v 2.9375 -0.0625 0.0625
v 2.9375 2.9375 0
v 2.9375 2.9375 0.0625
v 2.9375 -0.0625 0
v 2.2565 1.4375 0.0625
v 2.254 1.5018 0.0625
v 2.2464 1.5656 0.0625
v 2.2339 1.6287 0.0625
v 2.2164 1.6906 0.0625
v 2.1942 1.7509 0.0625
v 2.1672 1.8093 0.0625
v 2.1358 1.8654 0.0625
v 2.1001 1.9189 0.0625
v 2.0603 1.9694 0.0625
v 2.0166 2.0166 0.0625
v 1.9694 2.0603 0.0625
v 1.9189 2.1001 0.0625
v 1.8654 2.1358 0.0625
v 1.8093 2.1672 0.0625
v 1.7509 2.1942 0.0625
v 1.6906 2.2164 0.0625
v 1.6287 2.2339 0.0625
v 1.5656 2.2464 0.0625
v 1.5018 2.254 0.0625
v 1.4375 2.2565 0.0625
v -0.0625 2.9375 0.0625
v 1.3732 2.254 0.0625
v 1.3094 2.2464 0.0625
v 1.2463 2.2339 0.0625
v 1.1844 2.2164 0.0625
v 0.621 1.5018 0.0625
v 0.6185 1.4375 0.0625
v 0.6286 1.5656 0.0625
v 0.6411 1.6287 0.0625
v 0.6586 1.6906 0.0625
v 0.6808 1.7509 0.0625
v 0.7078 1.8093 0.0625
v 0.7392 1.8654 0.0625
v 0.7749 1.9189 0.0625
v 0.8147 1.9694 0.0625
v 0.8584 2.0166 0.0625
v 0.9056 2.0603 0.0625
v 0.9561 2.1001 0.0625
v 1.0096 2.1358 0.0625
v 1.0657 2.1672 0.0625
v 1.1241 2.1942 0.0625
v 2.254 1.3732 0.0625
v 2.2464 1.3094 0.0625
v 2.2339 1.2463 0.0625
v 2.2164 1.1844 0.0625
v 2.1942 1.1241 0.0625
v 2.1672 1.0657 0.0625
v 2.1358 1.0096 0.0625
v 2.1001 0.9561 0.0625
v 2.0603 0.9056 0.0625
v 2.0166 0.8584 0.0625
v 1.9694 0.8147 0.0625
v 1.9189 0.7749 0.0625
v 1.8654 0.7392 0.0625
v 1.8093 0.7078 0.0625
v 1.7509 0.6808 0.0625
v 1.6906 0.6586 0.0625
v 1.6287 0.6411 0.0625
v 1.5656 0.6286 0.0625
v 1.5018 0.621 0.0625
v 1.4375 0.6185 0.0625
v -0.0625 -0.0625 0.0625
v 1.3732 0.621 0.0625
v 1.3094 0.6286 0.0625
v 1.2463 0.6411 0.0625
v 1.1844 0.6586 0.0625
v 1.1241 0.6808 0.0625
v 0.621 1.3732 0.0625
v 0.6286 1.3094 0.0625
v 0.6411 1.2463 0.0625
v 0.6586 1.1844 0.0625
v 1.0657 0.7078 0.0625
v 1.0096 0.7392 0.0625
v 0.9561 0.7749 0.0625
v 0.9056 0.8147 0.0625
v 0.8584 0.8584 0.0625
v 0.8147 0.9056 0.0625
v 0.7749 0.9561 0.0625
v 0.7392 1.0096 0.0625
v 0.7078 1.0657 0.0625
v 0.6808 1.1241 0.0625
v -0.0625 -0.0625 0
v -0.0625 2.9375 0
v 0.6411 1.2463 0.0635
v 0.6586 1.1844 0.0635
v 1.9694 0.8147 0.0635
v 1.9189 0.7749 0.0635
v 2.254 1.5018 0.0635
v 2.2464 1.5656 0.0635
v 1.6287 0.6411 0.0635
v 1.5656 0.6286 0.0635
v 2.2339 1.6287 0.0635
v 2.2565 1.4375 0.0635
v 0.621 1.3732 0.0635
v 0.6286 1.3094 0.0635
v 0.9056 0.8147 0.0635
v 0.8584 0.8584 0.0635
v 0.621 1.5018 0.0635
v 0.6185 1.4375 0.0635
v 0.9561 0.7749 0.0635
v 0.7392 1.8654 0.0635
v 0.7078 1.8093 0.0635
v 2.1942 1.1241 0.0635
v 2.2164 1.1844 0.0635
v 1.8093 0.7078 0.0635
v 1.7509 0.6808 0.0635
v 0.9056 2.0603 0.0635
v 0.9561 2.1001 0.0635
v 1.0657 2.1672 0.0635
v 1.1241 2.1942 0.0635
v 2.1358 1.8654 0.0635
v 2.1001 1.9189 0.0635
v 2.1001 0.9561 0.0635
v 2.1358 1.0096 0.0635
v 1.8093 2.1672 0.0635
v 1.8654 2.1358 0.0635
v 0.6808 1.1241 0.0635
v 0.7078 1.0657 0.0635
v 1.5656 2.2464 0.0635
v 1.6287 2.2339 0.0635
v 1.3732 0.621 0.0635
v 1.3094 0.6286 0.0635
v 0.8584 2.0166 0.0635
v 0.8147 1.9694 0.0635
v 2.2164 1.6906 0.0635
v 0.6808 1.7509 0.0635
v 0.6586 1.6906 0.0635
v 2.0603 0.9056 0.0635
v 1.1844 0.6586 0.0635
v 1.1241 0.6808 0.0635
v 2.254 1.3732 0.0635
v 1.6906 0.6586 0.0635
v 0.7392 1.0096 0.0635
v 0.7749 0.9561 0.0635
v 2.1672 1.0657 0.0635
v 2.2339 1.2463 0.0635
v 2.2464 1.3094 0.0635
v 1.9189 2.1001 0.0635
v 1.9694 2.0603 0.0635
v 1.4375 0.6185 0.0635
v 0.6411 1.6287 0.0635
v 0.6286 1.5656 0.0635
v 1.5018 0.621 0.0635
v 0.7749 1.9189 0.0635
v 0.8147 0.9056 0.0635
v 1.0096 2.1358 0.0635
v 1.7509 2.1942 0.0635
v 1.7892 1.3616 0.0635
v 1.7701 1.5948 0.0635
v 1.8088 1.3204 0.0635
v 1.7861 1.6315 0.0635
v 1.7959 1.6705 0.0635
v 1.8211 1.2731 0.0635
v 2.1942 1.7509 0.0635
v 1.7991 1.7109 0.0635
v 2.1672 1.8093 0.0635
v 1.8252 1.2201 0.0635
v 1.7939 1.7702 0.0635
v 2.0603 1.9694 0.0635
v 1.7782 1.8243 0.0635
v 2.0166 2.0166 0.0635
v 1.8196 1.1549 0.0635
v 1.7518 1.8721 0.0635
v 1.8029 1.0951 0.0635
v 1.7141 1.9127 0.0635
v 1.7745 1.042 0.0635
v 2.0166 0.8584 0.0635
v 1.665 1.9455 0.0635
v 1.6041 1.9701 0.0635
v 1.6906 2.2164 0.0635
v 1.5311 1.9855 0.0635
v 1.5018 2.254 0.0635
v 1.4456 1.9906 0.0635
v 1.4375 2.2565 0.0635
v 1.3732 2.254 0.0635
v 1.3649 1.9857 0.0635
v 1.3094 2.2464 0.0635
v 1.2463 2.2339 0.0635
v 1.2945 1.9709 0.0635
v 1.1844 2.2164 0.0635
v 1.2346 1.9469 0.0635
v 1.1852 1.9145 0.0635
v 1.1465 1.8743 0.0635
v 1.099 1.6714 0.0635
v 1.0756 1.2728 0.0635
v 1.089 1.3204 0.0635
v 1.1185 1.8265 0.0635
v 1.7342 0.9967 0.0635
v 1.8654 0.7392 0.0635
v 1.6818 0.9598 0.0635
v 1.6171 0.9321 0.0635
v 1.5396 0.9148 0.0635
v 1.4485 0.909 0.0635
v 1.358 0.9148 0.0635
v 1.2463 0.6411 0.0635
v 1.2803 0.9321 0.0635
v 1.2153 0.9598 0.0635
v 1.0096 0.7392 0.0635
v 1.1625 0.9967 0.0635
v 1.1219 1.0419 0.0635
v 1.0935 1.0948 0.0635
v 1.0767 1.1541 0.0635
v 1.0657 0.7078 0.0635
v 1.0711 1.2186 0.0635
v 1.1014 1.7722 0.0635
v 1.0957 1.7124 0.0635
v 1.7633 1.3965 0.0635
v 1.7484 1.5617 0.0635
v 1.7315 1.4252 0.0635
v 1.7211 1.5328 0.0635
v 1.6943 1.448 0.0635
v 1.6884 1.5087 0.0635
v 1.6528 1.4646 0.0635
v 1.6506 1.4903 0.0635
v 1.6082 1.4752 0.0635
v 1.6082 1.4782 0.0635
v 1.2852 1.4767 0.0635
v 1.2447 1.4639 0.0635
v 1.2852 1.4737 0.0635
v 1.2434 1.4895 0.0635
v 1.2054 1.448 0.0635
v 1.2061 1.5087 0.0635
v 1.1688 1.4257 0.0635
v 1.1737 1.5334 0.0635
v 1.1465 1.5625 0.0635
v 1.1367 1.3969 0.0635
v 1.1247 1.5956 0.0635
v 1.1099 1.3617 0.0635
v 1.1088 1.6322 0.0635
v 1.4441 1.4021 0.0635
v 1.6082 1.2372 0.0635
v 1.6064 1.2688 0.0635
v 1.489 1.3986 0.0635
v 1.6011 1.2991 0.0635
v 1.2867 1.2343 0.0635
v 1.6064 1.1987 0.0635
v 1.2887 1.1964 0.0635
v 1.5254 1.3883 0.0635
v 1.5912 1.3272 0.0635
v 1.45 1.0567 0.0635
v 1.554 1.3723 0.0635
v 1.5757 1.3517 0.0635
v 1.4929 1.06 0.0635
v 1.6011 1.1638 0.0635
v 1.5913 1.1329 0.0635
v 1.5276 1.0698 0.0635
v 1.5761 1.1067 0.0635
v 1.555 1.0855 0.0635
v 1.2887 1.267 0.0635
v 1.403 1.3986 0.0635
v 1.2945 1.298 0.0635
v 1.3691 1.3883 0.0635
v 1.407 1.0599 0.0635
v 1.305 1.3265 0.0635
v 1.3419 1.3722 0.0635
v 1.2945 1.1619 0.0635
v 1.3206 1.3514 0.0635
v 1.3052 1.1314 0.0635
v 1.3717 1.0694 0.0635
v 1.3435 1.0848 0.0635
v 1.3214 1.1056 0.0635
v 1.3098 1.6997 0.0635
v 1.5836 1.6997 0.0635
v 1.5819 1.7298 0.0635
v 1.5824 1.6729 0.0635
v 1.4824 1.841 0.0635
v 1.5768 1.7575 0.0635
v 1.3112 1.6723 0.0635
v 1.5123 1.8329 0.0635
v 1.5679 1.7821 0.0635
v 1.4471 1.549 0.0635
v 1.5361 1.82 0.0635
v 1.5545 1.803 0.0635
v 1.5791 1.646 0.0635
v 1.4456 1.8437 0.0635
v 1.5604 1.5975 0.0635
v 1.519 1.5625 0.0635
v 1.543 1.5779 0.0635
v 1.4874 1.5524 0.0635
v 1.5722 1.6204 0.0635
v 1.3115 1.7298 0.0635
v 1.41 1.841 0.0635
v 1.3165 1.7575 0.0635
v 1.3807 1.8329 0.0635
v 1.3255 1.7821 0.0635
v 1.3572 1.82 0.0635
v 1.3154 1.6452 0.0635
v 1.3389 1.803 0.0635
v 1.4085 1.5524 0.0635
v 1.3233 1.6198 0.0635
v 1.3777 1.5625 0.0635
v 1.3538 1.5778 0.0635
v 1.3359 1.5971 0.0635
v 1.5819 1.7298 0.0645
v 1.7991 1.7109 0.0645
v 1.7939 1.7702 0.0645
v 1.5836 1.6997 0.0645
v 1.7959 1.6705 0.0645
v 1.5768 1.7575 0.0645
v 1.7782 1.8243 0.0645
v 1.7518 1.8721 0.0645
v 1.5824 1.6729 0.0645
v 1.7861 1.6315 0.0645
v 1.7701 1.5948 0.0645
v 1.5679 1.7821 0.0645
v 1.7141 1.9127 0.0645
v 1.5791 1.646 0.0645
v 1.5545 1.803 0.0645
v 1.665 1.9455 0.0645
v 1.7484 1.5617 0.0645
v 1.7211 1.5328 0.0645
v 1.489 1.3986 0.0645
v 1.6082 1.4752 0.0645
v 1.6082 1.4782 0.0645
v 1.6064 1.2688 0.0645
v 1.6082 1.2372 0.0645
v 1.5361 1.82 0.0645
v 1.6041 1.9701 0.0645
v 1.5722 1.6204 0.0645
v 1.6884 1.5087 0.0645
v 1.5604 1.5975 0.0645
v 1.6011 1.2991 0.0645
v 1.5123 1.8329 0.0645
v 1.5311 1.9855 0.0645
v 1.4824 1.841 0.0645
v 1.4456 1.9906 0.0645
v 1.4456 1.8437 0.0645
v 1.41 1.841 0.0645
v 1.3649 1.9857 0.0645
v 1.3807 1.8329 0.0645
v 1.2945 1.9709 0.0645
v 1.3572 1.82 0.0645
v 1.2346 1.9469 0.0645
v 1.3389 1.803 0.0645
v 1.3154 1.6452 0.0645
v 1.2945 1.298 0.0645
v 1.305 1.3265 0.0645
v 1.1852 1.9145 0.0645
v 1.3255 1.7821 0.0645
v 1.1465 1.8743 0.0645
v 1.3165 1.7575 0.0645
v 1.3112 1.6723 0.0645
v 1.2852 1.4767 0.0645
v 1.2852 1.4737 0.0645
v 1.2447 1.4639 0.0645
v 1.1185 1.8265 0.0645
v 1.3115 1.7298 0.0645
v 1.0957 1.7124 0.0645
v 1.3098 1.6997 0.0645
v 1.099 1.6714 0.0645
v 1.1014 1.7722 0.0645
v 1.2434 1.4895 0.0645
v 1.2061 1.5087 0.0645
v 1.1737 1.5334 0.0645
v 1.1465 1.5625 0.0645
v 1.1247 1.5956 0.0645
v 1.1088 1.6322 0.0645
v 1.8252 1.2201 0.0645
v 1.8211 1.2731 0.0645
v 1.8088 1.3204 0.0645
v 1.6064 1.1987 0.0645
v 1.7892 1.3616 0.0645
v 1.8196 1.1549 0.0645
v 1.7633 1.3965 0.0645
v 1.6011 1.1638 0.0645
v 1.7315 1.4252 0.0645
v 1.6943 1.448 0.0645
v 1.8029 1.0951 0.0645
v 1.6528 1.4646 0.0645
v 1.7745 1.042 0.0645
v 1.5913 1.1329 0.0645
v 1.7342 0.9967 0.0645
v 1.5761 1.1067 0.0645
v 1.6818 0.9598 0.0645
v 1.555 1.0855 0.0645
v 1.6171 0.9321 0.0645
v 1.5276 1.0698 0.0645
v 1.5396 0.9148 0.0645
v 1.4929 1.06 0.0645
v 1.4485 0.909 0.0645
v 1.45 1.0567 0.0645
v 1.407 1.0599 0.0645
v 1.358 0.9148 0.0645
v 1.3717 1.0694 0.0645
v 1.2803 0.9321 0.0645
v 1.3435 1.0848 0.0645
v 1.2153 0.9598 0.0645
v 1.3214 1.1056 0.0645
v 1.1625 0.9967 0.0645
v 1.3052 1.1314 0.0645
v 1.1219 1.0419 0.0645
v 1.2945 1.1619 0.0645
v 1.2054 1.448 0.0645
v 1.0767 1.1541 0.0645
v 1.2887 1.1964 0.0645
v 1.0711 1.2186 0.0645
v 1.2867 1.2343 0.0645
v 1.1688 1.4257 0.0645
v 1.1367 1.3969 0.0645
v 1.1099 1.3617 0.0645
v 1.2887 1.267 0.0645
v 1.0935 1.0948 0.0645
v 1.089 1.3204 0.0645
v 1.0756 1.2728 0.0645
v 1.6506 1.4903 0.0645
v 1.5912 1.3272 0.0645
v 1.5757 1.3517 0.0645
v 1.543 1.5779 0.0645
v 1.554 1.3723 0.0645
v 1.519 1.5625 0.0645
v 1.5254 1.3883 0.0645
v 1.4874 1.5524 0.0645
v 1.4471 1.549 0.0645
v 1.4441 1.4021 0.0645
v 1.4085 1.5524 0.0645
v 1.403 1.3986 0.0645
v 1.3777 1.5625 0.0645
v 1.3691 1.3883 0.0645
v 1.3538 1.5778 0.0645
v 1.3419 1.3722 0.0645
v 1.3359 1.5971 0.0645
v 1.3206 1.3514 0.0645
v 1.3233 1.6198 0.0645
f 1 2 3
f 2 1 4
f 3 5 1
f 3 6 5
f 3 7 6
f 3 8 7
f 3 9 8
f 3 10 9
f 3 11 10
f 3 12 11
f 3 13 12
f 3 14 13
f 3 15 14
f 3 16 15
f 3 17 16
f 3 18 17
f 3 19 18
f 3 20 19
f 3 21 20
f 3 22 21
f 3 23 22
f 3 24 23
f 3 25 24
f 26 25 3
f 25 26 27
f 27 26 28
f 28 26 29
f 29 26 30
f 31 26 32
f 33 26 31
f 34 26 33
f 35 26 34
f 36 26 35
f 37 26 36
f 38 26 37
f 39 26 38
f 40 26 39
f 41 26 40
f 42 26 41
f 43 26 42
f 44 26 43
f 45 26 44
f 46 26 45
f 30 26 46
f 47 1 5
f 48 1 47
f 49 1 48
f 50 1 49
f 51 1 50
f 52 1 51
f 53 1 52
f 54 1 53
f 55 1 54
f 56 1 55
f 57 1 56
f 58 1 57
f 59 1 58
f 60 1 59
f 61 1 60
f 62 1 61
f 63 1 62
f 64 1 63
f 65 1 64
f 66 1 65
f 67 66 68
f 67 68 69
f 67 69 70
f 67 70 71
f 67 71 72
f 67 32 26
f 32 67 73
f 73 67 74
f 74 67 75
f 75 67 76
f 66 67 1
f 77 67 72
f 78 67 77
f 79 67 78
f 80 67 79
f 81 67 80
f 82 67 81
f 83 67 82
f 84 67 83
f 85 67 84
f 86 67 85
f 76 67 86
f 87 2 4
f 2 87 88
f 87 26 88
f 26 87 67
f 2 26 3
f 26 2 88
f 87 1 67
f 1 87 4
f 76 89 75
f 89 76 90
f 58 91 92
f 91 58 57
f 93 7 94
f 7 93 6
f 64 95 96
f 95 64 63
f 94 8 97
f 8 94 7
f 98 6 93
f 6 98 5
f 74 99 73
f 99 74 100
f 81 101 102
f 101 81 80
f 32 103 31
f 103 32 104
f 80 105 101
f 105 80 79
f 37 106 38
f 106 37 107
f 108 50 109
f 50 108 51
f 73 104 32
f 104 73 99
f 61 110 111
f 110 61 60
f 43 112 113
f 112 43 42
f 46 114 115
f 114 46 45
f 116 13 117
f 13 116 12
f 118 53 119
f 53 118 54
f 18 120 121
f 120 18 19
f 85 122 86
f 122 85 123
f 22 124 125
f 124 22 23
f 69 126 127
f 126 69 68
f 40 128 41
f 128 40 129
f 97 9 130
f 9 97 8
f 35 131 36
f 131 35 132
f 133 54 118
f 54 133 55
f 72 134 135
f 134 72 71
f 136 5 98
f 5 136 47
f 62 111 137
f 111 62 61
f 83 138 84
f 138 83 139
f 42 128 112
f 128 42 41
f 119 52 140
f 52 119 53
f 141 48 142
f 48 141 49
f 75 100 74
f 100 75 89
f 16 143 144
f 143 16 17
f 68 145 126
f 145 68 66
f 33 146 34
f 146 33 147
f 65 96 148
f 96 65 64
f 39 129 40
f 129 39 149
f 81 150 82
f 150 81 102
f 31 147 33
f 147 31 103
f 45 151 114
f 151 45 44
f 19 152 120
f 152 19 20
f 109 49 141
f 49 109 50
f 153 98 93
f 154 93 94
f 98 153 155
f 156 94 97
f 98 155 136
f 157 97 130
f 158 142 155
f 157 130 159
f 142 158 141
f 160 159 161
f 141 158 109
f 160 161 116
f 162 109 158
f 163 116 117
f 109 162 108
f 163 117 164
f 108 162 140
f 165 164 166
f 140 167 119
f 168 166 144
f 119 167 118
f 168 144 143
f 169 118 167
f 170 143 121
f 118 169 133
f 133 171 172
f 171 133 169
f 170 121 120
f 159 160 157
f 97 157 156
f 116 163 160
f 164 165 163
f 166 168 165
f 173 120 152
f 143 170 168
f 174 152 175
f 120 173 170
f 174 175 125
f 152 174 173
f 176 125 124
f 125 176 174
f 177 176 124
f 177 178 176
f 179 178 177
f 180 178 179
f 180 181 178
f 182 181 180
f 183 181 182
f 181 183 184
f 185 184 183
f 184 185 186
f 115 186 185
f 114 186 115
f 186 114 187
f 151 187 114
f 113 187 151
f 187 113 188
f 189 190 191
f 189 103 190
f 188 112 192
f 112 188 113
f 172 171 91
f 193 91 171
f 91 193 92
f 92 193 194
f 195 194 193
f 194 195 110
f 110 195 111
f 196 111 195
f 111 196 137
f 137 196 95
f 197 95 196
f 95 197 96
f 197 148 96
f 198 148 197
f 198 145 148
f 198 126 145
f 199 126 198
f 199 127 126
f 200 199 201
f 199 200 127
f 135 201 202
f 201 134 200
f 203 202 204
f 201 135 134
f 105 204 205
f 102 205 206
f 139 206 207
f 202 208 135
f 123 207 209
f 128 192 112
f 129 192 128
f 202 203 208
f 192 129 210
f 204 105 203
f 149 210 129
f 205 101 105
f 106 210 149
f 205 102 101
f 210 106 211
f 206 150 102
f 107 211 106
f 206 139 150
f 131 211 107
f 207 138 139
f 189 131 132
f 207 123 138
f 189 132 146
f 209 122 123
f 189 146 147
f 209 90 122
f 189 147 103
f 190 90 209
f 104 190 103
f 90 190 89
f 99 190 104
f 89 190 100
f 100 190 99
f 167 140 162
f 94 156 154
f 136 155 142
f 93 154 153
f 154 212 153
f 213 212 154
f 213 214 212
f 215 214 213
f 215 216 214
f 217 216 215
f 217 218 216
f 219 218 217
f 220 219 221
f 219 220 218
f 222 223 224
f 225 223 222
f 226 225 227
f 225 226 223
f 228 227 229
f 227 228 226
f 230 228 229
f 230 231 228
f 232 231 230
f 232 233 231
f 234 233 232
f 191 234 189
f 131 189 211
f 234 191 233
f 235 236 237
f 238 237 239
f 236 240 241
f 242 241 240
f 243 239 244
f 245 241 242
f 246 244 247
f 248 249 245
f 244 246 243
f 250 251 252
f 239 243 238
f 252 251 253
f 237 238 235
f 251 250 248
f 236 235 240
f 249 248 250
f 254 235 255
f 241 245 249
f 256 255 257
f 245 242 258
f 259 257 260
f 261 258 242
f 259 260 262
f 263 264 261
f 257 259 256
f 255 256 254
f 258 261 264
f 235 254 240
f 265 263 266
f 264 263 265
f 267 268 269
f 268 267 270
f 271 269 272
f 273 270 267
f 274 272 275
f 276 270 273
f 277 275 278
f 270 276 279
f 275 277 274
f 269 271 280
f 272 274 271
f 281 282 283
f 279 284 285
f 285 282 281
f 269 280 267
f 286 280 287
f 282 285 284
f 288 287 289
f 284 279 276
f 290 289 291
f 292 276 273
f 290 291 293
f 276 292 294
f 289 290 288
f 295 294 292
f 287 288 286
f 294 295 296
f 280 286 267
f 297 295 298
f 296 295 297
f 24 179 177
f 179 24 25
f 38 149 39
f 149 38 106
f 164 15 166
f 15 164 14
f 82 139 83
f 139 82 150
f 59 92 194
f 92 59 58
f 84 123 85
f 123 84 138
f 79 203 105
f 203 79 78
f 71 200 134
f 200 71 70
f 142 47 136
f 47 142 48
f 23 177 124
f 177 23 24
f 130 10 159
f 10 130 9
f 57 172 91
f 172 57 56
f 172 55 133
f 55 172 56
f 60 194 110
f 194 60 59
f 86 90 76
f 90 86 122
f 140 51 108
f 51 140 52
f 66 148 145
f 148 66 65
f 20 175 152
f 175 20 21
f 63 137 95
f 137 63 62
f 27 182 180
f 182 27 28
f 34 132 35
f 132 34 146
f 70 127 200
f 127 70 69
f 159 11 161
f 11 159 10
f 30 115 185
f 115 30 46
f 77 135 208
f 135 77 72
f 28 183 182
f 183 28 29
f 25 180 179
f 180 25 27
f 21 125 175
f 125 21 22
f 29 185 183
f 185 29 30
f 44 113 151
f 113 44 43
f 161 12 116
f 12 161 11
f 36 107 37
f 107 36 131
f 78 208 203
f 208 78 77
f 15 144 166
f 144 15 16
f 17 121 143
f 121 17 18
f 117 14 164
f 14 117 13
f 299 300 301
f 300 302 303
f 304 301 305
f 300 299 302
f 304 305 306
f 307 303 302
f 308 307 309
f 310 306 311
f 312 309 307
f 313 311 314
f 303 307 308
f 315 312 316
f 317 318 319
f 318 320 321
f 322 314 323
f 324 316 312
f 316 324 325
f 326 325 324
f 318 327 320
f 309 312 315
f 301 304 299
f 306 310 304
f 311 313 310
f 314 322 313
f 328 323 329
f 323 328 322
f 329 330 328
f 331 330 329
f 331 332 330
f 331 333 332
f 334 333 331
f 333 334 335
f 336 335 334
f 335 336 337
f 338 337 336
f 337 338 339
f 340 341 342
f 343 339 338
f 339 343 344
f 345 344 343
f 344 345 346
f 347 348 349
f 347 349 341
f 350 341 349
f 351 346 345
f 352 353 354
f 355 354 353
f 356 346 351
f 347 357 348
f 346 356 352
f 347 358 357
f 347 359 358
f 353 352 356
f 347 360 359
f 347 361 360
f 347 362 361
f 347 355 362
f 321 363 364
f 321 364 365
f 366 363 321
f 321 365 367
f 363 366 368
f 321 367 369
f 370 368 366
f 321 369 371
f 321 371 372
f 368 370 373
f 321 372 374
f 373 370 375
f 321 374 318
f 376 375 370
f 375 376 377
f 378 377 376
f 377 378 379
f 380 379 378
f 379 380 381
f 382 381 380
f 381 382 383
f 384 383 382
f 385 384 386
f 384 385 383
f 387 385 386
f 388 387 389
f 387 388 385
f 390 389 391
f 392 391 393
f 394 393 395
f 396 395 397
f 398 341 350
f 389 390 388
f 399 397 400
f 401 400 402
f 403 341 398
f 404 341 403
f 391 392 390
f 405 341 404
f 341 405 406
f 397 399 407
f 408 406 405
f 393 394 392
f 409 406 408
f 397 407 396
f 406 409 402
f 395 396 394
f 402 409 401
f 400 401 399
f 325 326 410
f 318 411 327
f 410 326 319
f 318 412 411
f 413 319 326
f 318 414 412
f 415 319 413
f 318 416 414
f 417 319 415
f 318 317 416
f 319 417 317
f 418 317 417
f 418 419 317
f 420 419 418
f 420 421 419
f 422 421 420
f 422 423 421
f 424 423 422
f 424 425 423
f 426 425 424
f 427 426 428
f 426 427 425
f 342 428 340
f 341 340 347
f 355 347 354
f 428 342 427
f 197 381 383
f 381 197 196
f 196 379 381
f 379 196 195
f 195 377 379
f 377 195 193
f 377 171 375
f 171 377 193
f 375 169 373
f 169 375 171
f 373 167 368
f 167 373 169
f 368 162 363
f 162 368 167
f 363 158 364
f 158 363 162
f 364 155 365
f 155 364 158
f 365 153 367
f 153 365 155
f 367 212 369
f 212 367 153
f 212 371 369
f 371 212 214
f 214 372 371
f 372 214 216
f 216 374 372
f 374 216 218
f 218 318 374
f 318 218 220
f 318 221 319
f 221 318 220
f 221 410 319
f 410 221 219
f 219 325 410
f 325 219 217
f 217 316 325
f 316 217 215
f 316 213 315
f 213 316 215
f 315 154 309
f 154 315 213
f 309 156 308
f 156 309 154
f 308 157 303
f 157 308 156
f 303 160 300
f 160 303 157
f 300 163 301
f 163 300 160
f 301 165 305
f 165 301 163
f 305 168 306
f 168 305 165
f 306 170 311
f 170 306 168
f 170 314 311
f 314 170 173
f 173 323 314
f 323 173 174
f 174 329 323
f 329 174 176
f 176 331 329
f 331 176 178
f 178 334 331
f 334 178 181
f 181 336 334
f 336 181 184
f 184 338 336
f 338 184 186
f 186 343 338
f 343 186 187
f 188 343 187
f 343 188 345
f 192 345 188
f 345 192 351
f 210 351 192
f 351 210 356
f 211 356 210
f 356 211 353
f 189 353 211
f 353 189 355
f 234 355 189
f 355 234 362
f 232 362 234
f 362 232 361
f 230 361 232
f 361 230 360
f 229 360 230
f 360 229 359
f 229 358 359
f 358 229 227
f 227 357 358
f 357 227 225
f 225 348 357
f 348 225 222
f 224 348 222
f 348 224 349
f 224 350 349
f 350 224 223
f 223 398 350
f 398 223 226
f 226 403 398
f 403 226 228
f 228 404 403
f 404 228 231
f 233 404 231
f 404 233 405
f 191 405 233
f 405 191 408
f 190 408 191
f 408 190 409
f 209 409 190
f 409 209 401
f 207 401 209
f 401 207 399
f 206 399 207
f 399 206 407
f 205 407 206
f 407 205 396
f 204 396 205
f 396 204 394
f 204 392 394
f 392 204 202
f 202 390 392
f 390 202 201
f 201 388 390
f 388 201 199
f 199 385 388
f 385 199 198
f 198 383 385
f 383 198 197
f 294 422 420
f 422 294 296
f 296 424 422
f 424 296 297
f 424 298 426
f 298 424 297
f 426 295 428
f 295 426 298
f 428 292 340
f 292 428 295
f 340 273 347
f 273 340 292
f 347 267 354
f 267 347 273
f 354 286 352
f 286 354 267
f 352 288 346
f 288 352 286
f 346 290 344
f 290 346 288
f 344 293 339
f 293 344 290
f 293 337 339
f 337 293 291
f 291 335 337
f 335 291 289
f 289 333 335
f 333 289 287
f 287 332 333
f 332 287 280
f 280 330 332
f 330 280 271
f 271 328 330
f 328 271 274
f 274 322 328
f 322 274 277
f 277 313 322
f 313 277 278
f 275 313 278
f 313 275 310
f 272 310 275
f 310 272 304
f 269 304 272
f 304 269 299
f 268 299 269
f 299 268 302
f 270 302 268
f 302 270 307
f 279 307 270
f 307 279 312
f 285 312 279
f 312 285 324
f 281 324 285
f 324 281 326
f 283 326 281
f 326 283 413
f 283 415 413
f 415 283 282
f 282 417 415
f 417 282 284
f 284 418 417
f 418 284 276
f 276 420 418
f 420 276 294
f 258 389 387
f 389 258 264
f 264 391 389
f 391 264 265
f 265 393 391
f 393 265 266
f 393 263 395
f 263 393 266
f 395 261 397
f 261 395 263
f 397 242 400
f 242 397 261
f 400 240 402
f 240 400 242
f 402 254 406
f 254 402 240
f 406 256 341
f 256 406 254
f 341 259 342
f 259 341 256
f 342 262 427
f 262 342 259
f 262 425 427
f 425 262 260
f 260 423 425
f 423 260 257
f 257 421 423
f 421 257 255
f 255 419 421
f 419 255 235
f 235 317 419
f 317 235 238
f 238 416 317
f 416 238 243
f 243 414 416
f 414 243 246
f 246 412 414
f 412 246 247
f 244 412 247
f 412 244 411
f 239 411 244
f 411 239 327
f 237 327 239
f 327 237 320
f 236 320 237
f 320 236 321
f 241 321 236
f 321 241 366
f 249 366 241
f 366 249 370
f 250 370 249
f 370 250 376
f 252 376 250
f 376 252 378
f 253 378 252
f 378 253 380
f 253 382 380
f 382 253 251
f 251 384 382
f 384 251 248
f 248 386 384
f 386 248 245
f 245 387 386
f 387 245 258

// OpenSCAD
// element110.scad
// Spur gear tile — centered black gear ring with trapezoidal teeth.
// The open bore reveals a lighter interior (gear_bore module).
// Units: inches

plate_w = 2 + 7/8;
plate_d = 2 + 7/8;
plate_h = 1/16;
frame_w = 1/16;

hole_d = 3/32;
hole_r = hole_d / 2;

// Gear geometry — centered on tile
gear_n      = 20;    // number of teeth
gear_r_tip  = 1.18;  // outer radius at tooth tips
gear_r_root = 1.00;  // root radius at base of teeth
gear_r_bore = 0.82;  // bore (inner hole) radius
tooth_hw    = 4.5;   // half-angle of each tooth in degrees (total = 9°, gap = 9°)
tooth_tip_f = 0.80;  // tooth tip is narrower than base by this factor

// ── Standard modules ─────────────────────────────────────────────────────────

module rivet_holes() {
    spacing_x = plate_w / 10;
    spacing_y = plate_d / 10;
    inset_x   = spacing_x / 2;
    inset_y   = spacing_y / 2;
    // Front edge
    for (i = [0:9])
        translate([inset_x + i * spacing_x, inset_y,         -1])
            cylinder(h = plate_h + 2, r = hole_r, $fn = 20);
    // Back edge
    for (i = [0:9])
        translate([inset_x + i * spacing_x, plate_d - inset_y, -1])
            cylinder(h = plate_h + 2, r = hole_r, $fn = 20);
    // Left edge
    for (i = [0:9])
        translate([inset_x,           inset_y + i * spacing_y, -1])
            cylinder(h = plate_h + 2, r = hole_r, $fn = 20);
    // Right edge
    for (i = [0:9])
        translate([plate_w - inset_x, inset_y + i * spacing_y, -1])
            cylinder(h = plate_h + 2, r = hole_r, $fn = 20);
}

module frame() {
    color("black")
    difference() {
        translate([-frame_w, -frame_w, 0])
            cube([plate_w + 2 * frame_w, plate_d + 2 * frame_w, plate_h]);
        translate([0, 0, -0.001])
            cube([plate_w, plate_d, plate_h + 0.002]);
    }
}

module plate() {
    difference() {
        color("darkgray")
            cube([plate_w, plate_d, plate_h]);
        rivet_holes();
    }
}

rivet_h = plate_h;
module rivets() {
    spacing_x = plate_w / 10;
    spacing_y = plate_d / 10;
    inset_x   = spacing_x / 2;
    inset_y   = spacing_y / 2;
    color("lightgray") {
        for (i = [0:9])
            translate([inset_x + i * spacing_x, inset_y,         0])
                cylinder(h = rivet_h, r = hole_r, $fn = 20);
        for (i = [0:9])
            translate([inset_x + i * spacing_x, plate_d - inset_y, 0])
                cylinder(h = rivet_h, r = hole_r, $fn = 20);
        for (i = [0:9])
            translate([inset_x,           inset_y + i * spacing_y, 0])
                cylinder(h = rivet_h, r = hole_r, $fn = 20);
        for (i = [0:9])
            translate([plate_w - inset_x, inset_y + i * spacing_y, 0])
                cylinder(h = rivet_h, r = hole_r, $fn = 20);
    }
}

// ── Gear modules ─────────────────────────────────────────────────────────────

// Single trapezoidal tooth pointing in +x direction (before rotation)
module gear_tooth_2d() {
    polygon([
        [gear_r_root * cos(-tooth_hw),             gear_r_root * sin(-tooth_hw)],
        [gear_r_tip  * cos(-tooth_hw * tooth_tip_f), gear_r_tip  * sin(-tooth_hw * tooth_tip_f)],
        [gear_r_tip  * cos( tooth_hw * tooth_tip_f), gear_r_tip  * sin( tooth_hw * tooth_tip_f)],
        [gear_r_root * cos( tooth_hw),             gear_r_root * sin( tooth_hw)],
    ]);
}

// Full 2D gear profile (ring + teeth, without bore subtracted)
module gear_2d() {
    pitch = 360 / gear_n;
    union() {
        circle(r = gear_r_root, $fn = gear_n * 8);
        for (i = [0:gear_n - 1])
            rotate([0, 0, i * pitch])
                gear_tooth_2d();
    }
}

// Black gear ring + teeth with open bore
module gear() {
    color("black")
    translate([plate_w / 2, plate_d / 2, 0])
    linear_extrude(plate_h)
    difference() {
        gear_2d();
        circle(r = gear_r_bore, $fn = 80);
    }
}

// Lighter fill inside the bore (silver interior visible through center)
module gear_bore() {
    color([0.80, 0.80, 0.80])
    translate([plate_w / 2, plate_d / 2, 0])
    linear_extrude(plate_h + 0.001)
    circle(r = gear_r_bore - 0.001, $fn = 80);
}

// Green "1" centered inside the bore
module gear_label() {
    color("green")
    translate([plate_w / 2, plate_d / 2, 0])
    linear_extrude(plate_h + 0.002)
    text("8", size = 1.1, halign = "center", valign = "center",
         font = "Liberation Sans:style=Bold");
}

// ── Assembly ─────────────────────────────────────────────────────────────────

frame();
plate();
rivets();
gear_bore();
gear();
gear_label();
